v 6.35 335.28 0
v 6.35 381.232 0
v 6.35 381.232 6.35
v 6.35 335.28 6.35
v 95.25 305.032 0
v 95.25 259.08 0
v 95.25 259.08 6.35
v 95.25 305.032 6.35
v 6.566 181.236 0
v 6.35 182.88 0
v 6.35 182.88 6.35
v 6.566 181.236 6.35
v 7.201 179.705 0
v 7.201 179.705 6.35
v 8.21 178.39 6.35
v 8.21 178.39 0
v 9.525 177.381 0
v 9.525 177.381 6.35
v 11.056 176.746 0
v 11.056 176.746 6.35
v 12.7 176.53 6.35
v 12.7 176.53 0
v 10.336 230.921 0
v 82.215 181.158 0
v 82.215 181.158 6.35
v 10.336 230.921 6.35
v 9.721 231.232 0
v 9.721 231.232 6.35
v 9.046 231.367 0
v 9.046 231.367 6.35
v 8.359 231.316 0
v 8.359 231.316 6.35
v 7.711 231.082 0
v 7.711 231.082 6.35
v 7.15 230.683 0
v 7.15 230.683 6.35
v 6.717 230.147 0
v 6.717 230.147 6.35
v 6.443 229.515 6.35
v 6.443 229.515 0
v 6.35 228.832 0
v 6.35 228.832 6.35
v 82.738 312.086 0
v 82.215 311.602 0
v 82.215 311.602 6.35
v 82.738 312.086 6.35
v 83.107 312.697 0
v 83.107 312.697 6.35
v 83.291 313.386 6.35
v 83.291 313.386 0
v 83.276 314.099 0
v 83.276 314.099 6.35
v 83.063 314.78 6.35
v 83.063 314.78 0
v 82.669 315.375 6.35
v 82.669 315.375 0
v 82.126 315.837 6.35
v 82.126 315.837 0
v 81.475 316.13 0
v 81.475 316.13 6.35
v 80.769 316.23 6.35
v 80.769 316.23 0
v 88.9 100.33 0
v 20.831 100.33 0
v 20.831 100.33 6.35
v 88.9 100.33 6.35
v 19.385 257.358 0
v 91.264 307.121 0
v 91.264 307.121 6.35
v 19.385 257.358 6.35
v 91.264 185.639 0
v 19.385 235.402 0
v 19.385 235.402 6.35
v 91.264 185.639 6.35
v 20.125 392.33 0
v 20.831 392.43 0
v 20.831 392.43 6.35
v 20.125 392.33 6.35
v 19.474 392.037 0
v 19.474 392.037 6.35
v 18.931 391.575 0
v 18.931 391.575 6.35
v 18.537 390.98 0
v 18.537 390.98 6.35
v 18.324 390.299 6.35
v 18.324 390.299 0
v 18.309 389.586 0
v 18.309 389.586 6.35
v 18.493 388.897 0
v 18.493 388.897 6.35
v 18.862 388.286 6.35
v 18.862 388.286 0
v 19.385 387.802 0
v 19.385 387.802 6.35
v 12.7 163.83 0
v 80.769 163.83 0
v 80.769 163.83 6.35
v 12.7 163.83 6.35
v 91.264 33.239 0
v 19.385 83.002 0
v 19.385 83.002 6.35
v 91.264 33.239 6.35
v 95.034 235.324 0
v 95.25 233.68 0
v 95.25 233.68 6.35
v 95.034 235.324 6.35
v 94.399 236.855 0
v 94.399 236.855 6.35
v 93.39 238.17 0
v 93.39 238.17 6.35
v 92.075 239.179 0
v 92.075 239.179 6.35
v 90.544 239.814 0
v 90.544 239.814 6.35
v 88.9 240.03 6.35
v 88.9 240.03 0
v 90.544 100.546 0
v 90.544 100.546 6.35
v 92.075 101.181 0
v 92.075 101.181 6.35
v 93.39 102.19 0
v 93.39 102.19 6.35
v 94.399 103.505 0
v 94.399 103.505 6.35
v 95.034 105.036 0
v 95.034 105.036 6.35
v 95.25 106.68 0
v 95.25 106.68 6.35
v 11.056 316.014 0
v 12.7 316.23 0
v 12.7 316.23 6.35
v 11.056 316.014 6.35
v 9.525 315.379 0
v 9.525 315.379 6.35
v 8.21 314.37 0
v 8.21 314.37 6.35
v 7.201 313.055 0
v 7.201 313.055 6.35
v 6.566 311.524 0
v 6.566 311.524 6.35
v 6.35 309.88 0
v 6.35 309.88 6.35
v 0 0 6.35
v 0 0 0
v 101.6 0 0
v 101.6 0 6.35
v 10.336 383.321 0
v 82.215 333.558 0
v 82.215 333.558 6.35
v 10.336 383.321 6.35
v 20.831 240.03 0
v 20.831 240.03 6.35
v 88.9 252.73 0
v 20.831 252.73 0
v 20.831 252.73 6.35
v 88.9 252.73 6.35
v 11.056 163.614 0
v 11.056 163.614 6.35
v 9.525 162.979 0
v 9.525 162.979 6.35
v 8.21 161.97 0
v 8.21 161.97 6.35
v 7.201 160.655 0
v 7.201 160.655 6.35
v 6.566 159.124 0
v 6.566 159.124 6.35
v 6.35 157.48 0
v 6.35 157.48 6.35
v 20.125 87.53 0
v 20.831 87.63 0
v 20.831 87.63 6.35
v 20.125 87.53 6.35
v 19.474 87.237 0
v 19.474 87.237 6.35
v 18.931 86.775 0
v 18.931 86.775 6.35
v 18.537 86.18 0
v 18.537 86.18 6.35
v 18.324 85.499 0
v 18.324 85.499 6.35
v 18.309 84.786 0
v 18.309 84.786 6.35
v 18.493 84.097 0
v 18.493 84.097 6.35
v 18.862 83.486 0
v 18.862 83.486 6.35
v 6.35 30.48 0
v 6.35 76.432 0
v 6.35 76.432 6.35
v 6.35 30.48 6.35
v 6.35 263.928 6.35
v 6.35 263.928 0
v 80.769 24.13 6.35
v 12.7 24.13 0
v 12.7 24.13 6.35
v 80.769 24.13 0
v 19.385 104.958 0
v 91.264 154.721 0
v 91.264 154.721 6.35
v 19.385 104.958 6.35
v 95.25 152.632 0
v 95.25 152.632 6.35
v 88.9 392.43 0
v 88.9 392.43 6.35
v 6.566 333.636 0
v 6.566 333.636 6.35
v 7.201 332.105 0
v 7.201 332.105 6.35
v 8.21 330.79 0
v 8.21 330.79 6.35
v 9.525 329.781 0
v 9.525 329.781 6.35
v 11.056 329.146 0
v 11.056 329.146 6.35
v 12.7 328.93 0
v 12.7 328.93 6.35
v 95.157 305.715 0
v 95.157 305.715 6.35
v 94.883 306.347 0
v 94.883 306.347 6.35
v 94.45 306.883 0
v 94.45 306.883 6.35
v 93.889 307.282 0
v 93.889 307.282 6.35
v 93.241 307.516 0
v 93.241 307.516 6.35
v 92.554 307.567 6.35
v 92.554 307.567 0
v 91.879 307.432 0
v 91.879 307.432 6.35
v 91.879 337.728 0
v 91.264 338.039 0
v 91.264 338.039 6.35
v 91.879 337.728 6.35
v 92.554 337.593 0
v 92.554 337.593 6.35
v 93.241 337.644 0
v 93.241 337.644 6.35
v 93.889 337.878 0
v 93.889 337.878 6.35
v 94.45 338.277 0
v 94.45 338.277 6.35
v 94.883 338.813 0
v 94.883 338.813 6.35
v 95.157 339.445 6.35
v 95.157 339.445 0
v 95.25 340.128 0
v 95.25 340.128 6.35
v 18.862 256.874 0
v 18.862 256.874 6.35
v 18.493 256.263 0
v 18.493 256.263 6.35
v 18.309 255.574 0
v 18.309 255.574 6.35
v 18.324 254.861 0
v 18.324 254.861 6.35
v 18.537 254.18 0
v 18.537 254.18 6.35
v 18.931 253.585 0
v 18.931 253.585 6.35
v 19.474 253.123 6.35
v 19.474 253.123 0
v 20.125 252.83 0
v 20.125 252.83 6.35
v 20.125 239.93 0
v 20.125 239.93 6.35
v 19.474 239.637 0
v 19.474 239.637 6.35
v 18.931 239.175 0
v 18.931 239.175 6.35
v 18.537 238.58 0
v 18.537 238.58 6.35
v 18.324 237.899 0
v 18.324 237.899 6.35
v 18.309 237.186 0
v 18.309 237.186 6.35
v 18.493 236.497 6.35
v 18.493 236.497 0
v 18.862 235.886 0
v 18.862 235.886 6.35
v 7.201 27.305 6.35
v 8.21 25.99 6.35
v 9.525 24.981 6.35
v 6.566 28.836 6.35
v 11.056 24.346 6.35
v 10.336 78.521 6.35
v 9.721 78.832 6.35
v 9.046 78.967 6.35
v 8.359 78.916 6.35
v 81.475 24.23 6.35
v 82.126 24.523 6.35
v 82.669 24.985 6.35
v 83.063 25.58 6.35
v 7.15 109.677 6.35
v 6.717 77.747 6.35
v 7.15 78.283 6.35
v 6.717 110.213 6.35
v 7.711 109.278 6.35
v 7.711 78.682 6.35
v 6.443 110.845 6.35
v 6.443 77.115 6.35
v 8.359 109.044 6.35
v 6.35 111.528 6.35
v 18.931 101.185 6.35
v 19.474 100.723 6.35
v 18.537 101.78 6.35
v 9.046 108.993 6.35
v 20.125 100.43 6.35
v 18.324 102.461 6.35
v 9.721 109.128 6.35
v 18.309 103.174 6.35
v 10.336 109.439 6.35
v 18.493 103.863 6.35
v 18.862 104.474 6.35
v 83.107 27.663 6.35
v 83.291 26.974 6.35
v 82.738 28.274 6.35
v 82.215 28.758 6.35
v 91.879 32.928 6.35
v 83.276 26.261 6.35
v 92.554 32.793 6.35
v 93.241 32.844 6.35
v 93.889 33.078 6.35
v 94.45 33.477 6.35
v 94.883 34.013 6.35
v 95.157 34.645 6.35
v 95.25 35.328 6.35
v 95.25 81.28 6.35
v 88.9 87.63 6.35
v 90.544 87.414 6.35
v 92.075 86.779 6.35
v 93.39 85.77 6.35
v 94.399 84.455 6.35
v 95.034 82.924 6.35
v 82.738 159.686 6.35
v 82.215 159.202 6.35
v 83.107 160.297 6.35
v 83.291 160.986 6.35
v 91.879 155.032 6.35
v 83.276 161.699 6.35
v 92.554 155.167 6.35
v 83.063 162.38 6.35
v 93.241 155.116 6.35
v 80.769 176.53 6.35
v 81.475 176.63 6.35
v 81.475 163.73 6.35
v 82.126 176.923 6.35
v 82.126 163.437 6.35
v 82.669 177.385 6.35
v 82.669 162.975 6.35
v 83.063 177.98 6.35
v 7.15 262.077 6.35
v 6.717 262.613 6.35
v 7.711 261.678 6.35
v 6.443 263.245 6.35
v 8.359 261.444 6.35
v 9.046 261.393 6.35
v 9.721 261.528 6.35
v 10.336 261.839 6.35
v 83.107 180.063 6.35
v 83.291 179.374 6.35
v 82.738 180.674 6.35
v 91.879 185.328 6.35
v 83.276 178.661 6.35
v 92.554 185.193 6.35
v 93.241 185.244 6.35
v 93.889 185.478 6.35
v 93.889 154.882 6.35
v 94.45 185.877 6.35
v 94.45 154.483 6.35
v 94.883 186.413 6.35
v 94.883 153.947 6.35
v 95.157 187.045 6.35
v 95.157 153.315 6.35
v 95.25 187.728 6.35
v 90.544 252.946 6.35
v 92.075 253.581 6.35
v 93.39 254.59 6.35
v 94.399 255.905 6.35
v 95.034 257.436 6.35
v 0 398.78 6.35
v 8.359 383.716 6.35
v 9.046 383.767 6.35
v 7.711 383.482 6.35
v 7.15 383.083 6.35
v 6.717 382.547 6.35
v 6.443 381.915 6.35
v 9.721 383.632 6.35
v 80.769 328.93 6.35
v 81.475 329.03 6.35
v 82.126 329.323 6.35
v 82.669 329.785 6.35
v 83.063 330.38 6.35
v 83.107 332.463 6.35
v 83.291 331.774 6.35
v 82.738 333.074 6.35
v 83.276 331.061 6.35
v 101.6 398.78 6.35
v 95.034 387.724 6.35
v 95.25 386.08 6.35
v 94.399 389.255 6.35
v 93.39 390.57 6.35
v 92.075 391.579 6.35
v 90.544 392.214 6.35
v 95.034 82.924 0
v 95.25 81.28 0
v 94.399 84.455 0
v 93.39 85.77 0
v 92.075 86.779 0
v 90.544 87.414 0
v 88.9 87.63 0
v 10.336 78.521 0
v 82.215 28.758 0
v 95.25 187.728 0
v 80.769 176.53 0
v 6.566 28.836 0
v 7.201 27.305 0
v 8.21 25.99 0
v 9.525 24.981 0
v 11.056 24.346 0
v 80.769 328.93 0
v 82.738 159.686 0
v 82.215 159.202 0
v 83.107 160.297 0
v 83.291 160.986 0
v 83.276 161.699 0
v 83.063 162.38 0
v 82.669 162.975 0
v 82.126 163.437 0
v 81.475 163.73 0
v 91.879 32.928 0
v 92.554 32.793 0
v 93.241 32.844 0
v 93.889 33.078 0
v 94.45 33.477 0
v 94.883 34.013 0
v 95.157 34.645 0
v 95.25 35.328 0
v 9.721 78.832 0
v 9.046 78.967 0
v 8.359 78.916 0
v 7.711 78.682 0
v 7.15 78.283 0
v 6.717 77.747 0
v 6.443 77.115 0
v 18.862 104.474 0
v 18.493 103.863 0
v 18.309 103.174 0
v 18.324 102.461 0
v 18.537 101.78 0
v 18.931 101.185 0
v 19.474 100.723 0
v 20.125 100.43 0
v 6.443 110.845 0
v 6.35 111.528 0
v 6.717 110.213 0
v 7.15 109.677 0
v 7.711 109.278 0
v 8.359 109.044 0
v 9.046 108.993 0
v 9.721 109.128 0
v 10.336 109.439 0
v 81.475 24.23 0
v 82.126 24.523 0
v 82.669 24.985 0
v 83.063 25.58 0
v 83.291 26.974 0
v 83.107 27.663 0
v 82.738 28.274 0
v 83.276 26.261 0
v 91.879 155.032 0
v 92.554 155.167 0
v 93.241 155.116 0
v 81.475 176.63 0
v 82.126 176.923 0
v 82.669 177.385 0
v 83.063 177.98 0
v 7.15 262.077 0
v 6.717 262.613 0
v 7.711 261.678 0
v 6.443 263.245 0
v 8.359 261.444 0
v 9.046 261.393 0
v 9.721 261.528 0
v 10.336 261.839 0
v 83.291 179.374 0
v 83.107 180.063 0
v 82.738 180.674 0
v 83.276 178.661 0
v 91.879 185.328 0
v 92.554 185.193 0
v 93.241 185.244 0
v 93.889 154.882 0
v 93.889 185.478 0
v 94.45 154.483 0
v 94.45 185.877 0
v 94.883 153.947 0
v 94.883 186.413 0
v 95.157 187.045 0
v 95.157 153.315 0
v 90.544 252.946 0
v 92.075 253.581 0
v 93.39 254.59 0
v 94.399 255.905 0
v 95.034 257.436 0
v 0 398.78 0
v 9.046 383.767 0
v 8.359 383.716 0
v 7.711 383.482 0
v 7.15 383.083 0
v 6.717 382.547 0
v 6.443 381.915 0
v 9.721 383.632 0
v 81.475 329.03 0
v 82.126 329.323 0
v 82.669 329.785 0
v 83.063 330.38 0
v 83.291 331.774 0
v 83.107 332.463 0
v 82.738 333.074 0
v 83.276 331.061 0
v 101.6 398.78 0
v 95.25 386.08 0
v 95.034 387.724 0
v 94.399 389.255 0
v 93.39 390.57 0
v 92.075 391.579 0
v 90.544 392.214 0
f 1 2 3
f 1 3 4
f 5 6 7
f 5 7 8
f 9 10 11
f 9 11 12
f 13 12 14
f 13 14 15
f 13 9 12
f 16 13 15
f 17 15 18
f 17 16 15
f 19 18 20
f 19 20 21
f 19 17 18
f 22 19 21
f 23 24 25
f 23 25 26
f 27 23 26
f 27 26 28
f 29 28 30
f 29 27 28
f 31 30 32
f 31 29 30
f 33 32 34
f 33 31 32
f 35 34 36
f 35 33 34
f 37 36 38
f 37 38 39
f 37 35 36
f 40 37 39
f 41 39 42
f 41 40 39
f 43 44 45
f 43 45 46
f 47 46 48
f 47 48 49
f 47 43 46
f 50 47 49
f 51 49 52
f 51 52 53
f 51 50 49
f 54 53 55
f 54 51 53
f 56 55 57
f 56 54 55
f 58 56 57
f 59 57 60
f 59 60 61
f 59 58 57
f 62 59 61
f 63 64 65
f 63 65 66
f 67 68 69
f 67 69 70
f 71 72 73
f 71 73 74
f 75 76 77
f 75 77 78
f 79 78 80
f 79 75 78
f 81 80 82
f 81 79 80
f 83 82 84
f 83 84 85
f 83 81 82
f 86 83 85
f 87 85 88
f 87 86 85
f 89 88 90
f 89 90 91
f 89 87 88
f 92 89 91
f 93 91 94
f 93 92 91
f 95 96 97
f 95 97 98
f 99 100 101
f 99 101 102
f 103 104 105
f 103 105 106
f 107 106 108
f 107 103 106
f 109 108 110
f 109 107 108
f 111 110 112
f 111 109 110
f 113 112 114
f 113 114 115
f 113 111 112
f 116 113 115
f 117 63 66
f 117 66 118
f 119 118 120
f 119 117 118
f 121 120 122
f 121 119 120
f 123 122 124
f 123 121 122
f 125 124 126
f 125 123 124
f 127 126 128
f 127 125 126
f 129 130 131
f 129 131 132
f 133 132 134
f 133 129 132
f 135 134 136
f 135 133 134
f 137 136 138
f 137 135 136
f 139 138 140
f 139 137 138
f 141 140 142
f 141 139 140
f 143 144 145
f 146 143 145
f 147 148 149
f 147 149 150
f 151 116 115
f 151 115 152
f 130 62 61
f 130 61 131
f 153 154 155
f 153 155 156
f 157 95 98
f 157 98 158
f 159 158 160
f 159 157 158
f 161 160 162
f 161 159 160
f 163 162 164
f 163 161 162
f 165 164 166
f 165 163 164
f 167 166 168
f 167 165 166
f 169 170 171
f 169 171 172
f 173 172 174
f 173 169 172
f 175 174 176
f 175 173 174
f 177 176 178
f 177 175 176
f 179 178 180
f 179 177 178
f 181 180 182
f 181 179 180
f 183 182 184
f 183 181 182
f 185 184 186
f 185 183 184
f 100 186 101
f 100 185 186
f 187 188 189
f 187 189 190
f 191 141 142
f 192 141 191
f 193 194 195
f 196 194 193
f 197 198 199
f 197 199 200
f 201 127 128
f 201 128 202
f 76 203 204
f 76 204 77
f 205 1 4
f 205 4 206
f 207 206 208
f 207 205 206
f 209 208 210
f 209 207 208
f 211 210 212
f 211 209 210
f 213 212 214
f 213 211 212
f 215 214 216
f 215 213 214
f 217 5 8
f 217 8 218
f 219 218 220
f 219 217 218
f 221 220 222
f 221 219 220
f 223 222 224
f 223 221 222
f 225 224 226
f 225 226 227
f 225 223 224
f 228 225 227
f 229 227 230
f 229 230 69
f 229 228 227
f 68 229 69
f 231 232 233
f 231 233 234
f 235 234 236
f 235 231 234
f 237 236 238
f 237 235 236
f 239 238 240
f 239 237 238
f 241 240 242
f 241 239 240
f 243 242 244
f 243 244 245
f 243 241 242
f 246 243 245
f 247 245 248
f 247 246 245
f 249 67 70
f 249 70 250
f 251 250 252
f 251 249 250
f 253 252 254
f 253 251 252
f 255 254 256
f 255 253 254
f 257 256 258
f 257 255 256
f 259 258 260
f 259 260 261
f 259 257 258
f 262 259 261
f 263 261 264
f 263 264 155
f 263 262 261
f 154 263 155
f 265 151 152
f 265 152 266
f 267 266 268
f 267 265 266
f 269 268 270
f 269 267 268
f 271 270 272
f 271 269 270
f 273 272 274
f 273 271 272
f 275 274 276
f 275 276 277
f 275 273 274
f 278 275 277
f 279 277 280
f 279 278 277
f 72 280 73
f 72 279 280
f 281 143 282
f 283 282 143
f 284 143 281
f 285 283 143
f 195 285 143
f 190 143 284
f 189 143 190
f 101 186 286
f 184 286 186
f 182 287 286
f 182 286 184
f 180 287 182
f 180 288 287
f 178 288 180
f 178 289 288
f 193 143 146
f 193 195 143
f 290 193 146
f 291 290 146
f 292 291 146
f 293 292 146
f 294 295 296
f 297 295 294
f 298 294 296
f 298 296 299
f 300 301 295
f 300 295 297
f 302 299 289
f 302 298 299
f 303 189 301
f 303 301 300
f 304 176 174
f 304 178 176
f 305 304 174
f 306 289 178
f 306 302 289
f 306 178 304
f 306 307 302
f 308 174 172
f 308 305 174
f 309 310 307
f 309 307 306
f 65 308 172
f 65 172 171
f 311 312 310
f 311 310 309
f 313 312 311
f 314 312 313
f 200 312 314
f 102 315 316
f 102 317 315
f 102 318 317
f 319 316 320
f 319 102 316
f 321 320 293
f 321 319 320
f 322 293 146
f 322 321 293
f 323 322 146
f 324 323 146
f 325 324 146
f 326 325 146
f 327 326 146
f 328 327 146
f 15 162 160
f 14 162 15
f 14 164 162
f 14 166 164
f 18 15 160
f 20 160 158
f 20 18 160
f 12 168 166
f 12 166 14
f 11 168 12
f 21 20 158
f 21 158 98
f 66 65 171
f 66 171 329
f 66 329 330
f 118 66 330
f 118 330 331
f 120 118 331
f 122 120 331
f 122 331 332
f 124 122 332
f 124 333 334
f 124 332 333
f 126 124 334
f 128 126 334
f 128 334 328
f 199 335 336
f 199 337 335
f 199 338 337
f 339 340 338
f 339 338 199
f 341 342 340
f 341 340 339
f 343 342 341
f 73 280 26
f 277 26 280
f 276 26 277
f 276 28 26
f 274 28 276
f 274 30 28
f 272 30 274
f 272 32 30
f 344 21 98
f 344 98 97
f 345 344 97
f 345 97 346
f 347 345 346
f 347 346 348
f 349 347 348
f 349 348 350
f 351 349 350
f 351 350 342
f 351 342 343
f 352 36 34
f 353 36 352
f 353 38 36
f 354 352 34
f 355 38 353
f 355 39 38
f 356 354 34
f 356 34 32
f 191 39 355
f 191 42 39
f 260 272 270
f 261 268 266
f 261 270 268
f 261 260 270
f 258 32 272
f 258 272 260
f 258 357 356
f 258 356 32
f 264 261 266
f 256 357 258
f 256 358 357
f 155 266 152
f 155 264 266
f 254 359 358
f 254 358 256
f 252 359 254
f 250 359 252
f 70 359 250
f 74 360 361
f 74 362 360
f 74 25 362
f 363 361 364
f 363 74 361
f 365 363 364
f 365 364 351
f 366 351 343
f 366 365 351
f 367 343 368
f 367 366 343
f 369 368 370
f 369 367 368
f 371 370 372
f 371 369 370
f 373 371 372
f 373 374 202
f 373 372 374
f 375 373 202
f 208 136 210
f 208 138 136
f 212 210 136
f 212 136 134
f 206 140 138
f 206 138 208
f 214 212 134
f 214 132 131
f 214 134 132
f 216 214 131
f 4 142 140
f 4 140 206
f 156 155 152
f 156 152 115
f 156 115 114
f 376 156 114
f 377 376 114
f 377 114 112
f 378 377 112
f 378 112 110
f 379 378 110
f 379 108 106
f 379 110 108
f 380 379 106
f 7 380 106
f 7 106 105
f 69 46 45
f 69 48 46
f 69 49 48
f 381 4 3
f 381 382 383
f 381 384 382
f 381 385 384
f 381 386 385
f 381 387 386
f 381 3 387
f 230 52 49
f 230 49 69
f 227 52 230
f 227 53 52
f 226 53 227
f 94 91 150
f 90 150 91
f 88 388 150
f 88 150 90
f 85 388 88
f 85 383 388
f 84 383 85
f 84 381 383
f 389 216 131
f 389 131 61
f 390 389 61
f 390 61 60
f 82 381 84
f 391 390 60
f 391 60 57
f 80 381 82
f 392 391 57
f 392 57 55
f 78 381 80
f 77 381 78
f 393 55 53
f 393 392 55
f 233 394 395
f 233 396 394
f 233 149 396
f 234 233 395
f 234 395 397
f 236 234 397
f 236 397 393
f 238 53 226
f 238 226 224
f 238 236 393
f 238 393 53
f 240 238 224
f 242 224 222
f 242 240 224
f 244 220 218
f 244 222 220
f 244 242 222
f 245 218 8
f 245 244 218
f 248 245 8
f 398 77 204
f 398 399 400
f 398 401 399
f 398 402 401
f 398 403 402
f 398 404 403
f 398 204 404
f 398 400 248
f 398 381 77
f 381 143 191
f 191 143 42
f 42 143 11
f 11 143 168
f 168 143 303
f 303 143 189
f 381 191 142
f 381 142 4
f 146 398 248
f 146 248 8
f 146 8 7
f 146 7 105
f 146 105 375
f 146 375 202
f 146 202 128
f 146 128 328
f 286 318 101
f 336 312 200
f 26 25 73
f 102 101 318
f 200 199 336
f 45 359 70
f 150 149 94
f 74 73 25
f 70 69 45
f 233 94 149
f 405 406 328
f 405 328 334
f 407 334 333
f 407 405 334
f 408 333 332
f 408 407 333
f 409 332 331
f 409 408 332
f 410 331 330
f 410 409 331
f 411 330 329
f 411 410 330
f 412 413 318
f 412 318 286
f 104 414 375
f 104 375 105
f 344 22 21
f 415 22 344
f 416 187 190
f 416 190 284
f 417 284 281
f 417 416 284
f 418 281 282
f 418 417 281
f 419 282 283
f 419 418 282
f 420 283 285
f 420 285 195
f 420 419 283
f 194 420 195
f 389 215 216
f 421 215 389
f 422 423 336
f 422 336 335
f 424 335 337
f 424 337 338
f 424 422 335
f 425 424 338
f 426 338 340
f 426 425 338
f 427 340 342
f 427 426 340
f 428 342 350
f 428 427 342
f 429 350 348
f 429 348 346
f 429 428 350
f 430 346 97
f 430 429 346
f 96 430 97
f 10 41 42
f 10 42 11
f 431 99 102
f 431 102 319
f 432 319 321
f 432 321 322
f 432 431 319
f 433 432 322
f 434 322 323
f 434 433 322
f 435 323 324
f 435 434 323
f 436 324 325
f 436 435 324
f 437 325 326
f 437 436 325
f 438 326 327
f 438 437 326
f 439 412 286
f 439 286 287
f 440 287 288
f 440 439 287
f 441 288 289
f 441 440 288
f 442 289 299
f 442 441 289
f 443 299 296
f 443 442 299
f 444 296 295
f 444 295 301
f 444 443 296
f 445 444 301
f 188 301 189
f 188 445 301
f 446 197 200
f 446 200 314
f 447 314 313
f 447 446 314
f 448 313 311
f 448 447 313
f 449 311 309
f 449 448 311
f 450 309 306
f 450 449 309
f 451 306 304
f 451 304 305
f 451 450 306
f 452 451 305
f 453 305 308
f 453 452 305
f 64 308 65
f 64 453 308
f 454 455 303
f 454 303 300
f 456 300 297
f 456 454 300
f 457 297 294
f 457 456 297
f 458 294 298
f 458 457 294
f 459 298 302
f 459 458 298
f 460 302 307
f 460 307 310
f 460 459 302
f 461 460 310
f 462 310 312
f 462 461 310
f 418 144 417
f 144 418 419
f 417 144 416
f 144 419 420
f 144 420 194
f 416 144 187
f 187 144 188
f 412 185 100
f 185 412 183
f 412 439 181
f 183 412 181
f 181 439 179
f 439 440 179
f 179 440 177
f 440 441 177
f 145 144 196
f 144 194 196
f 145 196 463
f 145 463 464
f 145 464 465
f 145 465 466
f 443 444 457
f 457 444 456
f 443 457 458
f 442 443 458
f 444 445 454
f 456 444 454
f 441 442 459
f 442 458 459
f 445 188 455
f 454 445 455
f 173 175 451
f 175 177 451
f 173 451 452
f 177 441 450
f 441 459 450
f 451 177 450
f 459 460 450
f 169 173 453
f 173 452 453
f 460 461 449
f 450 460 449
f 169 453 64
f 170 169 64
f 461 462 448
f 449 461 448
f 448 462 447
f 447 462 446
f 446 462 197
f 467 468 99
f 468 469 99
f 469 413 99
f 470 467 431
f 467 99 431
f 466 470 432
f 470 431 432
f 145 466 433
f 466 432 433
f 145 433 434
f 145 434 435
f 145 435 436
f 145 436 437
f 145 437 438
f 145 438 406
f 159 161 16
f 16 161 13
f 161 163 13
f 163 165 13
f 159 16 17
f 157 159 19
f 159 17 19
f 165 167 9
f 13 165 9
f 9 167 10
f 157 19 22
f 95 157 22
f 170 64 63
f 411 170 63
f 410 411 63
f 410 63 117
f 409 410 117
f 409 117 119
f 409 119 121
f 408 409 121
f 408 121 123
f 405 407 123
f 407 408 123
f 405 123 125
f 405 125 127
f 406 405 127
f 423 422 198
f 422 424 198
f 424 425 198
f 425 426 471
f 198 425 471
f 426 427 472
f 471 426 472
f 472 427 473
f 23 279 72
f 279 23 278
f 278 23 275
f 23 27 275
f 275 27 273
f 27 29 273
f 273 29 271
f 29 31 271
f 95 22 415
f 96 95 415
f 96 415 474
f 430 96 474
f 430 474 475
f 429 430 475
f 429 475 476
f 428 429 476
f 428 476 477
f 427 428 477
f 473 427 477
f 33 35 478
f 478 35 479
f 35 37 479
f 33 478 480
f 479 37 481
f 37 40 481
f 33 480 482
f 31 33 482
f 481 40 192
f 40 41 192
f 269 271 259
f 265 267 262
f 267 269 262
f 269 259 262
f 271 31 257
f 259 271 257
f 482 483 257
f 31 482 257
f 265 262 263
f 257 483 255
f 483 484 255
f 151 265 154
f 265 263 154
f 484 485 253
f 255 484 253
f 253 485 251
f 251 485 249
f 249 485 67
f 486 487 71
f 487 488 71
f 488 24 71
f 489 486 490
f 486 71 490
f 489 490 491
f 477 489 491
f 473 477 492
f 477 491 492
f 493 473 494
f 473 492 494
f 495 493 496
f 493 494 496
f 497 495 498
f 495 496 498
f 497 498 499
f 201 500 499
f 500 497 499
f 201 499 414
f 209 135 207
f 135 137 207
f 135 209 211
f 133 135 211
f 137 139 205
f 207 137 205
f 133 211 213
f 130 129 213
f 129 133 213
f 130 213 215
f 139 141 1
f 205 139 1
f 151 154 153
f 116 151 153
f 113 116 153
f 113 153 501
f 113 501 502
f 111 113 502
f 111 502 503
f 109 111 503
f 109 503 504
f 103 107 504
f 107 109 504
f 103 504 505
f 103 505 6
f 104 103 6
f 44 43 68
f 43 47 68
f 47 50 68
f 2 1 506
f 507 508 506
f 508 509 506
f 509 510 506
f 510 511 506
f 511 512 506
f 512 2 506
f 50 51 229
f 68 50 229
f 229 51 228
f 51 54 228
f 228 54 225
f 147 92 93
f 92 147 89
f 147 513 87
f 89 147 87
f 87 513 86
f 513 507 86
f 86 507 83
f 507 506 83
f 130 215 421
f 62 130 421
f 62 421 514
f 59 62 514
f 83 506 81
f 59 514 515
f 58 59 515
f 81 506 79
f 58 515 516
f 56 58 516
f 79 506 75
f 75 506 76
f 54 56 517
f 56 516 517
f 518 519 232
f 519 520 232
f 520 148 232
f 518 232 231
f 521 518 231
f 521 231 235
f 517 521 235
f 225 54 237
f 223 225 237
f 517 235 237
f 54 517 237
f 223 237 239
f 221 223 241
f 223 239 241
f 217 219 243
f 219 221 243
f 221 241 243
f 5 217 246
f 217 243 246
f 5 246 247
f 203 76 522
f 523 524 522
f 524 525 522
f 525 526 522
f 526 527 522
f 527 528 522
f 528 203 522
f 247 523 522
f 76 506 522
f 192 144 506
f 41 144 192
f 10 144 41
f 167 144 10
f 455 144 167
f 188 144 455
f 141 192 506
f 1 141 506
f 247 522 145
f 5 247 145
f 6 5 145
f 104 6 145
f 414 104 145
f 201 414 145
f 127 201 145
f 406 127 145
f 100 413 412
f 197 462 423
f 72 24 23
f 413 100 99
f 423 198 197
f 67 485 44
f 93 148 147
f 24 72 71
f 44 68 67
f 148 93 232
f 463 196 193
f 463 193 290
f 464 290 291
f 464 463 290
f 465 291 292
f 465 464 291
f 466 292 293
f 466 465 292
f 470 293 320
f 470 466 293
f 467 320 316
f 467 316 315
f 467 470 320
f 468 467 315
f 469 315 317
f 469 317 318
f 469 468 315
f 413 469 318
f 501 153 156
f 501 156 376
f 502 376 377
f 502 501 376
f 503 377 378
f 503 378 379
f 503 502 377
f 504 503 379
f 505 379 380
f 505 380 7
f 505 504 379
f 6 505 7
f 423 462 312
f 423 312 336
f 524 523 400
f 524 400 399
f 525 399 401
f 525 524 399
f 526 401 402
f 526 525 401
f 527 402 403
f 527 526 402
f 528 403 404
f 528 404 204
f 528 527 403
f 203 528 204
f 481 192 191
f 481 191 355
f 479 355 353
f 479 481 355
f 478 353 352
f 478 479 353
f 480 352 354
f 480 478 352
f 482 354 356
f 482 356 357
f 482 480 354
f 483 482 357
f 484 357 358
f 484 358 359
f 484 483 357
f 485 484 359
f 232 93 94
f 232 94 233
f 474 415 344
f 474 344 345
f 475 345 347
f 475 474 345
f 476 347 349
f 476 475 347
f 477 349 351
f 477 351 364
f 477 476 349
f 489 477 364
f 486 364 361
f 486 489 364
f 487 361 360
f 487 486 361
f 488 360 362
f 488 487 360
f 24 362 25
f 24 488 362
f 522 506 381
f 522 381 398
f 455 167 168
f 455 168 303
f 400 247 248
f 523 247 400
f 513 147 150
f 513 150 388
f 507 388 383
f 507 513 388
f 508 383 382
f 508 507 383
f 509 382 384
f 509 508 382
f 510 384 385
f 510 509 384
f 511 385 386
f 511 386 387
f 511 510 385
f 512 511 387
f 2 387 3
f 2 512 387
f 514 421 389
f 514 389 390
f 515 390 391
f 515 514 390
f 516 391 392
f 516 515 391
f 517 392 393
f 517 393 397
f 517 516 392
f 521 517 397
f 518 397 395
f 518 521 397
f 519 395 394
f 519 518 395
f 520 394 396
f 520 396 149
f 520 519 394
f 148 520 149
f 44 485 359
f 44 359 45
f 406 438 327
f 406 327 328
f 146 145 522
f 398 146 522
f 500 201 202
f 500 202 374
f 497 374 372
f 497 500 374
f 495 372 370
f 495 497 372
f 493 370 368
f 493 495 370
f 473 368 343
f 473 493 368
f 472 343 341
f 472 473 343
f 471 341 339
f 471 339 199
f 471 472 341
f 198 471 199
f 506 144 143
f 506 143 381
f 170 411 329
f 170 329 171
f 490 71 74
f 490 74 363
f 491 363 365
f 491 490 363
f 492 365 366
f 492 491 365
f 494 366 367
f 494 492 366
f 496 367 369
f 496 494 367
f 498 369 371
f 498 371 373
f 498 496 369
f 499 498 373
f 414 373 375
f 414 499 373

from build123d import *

# Parameters (mm, degrees)
MODEL_W             = 101.6
MODEL_H             = 398.78
BOSS_EXTRUDE1_DEPTH = 6.35


with BuildPart() as part:
    # Model → Boss-Extrude1 (new body)
    with BuildSketch(Plane.XY):
        with Locations((50.8, 199.39)):
            Rectangle(MODEL_W, MODEL_H)
        with BuildLine():
            Line((88.9, 87.63), (20.83121403, 87.63))
            ThreePointArc((20.83121403, 87.63), (18.406749642, 85.847345646), (19.385420684, 83.001631833))
            Line((19.385420684, 83.001631833), (91.264206654, 33.239395393))
            ThreePointArc((91.264206654, 33.239395393), (93.888830968, 33.077884107), (95.25, 35.32776356))
            Line((95.25, 35.32776356), (95.25, 81.28))
            ThreePointArc((95.25, 81.28), (93.390128061, 85.770128061), (88.9, 87.63))
        make_face(mode=Mode.SUBTRACT)
        with BuildLine():
            Line((6.35, 157.48), (6.35, 111.52776356))
            ThreePointArc((6.35, 111.52776356), (7.711169032, 109.277884107), (10.335793346, 109.439395393))
            Line((10.335793346, 109.439395393), (82.214579316, 159.201631833))
            ThreePointArc((82.214579316, 159.201631833), (83.193250358, 162.047345646), (80.76878597, 163.83))
            Line((80.76878597, 163.83), (12.7, 163.83))
            ThreePointArc((12.7, 163.83), (8.209871939, 161.970128061), (6.35, 157.48))
        make_face(mode=Mode.SUBTRACT)
        with BuildLine():
            Line((88.9, 240.03), (20.83121403, 240.03))
            ThreePointArc((20.83121403, 240.03), (18.406749642, 238.247345646), (19.385420684, 235.401631833))
            Line((19.385420684, 235.401631833), (91.264206654, 185.639395393))
            ThreePointArc((91.264206654, 185.639395393), (93.888830968, 185.477884107), (95.25, 187.72776356))
            Line((95.25, 187.72776356), (95.25, 233.68))
            ThreePointArc((95.25, 233.68), (93.390128061, 238.170128061), (88.9, 240.03))
        make_face(mode=Mode.SUBTRACT)
        with BuildLine():
            Line((12.7, 176.53), (80.76878597, 176.53))
            ThreePointArc((80.76878597, 176.53), (83.193250358, 178.312654354), (82.214579316, 181.158368167))
            Line((82.214579316, 181.158368167), (10.335793346, 230.920604607))
            ThreePointArc((10.335793346, 230.920604607), (7.711169032, 231.082115893), (6.35, 228.83223644))
            Line((6.35, 228.83223644), (6.35, 182.88))
            ThreePointArc((6.35, 182.88), (8.209871939, 178.389871939), (12.7, 176.53))
        make_face(mode=Mode.SUBTRACT)
        with BuildLine():
            Line((91.264206654, 154.720604607), (19.385420684, 104.958368167))
            ThreePointArc((19.385420684, 104.958368167), (18.406749642, 102.112654354), (20.83121403, 100.33))
            Line((20.83121403, 100.33), (88.9, 100.33))
            ThreePointArc((88.9, 100.33), (93.390128061, 102.189871939), (95.25, 106.68))
            Line((95.25, 106.68), (95.25, 152.63223644))
            ThreePointArc((95.25, 152.63223644), (93.888830968, 154.882115893), (91.264206654, 154.720604607))
        make_face(mode=Mode.SUBTRACT)
        with BuildLine():
            Line((6.35, 309.88), (6.35, 263.92776356))
            ThreePointArc((6.35, 263.92776356), (7.711169032, 261.677884107), (10.335793346, 261.839395393))
            Line((10.335793346, 261.839395393), (82.214579316, 311.601631833))
            ThreePointArc((82.214579316, 311.601631833), (83.193250358, 314.447345646), (80.76878597, 316.23))
            Line((80.76878597, 316.23), (12.7, 316.23))
            ThreePointArc((12.7, 316.23), (8.209871939, 314.370128061), (6.35, 309.88))
        make_face(mode=Mode.SUBTRACT)
        with BuildLine():
            Line((88.9, 392.43), (20.83121403, 392.43))
            ThreePointArc((20.83121403, 392.43), (18.406749642, 390.647345646), (19.385420684, 387.801631833))
            Line((19.385420684, 387.801631833), (91.264206654, 338.039395393))
            ThreePointArc((91.264206654, 338.039395393), (93.888830968, 337.877884107), (95.25, 340.12776356))
            Line((95.25, 340.12776356), (95.25, 386.08))
            ThreePointArc((95.25, 386.08), (93.390128061, 390.570128061), (88.9, 392.43))
        make_face(mode=Mode.SUBTRACT)
        with BuildLine():
            Line((12.7, 328.93), (80.76878597, 328.93))
            ThreePointArc((80.76878597, 328.93), (83.193250358, 330.712654354), (82.214579316, 333.558368167))
            Line((82.214579316, 333.558368167), (10.335793346, 383.320604607))
            ThreePointArc((10.335793346, 383.320604607), (7.711169032, 383.482115893), (6.35, 381.23223644))
            Line((6.35, 381.23223644), (6.35, 335.28))
            ThreePointArc((6.35, 335.28), (8.209871939, 330.789871939), (12.7, 328.93))
        make_face(mode=Mode.SUBTRACT)
        with BuildLine():
            Line((12.7, 24.13), (80.76878597, 24.13))
            ThreePointArc((80.76878597, 24.13), (83.193250358, 25.912654354), (82.214579316, 28.758368167))
            Line((82.214579316, 28.758368167), (10.335793346, 78.520604607))
            ThreePointArc((10.335793346, 78.520604607), (7.711169032, 78.682115893), (6.35, 76.43223644))
            Line((6.35, 76.43223644), (6.35, 30.48))
            ThreePointArc((6.35, 30.48), (8.209871939, 25.989871939), (12.7, 24.13))
        make_face(mode=Mode.SUBTRACT)
        with BuildLine():
            Line((91.264206654, 307.120604607), (19.385420684, 257.358368167))
            ThreePointArc((19.385420684, 257.358368167), (18.406749642, 254.512654354), (20.83121403, 252.73))
            Line((20.83121403, 252.73), (88.9, 252.73))
            ThreePointArc((88.9, 252.73), (93.390128061, 254.589871939), (95.25, 259.08))
            Line((95.25, 259.08), (95.25, 305.03223644))
            ThreePointArc((95.25, 305.03223644), (93.888830968, 307.282115893), (91.264206654, 307.120604607))
        make_face(mode=Mode.SUBTRACT)
    extrude(amount=BOSS_EXTRUDE1_DEPTH)


solid = part.part
